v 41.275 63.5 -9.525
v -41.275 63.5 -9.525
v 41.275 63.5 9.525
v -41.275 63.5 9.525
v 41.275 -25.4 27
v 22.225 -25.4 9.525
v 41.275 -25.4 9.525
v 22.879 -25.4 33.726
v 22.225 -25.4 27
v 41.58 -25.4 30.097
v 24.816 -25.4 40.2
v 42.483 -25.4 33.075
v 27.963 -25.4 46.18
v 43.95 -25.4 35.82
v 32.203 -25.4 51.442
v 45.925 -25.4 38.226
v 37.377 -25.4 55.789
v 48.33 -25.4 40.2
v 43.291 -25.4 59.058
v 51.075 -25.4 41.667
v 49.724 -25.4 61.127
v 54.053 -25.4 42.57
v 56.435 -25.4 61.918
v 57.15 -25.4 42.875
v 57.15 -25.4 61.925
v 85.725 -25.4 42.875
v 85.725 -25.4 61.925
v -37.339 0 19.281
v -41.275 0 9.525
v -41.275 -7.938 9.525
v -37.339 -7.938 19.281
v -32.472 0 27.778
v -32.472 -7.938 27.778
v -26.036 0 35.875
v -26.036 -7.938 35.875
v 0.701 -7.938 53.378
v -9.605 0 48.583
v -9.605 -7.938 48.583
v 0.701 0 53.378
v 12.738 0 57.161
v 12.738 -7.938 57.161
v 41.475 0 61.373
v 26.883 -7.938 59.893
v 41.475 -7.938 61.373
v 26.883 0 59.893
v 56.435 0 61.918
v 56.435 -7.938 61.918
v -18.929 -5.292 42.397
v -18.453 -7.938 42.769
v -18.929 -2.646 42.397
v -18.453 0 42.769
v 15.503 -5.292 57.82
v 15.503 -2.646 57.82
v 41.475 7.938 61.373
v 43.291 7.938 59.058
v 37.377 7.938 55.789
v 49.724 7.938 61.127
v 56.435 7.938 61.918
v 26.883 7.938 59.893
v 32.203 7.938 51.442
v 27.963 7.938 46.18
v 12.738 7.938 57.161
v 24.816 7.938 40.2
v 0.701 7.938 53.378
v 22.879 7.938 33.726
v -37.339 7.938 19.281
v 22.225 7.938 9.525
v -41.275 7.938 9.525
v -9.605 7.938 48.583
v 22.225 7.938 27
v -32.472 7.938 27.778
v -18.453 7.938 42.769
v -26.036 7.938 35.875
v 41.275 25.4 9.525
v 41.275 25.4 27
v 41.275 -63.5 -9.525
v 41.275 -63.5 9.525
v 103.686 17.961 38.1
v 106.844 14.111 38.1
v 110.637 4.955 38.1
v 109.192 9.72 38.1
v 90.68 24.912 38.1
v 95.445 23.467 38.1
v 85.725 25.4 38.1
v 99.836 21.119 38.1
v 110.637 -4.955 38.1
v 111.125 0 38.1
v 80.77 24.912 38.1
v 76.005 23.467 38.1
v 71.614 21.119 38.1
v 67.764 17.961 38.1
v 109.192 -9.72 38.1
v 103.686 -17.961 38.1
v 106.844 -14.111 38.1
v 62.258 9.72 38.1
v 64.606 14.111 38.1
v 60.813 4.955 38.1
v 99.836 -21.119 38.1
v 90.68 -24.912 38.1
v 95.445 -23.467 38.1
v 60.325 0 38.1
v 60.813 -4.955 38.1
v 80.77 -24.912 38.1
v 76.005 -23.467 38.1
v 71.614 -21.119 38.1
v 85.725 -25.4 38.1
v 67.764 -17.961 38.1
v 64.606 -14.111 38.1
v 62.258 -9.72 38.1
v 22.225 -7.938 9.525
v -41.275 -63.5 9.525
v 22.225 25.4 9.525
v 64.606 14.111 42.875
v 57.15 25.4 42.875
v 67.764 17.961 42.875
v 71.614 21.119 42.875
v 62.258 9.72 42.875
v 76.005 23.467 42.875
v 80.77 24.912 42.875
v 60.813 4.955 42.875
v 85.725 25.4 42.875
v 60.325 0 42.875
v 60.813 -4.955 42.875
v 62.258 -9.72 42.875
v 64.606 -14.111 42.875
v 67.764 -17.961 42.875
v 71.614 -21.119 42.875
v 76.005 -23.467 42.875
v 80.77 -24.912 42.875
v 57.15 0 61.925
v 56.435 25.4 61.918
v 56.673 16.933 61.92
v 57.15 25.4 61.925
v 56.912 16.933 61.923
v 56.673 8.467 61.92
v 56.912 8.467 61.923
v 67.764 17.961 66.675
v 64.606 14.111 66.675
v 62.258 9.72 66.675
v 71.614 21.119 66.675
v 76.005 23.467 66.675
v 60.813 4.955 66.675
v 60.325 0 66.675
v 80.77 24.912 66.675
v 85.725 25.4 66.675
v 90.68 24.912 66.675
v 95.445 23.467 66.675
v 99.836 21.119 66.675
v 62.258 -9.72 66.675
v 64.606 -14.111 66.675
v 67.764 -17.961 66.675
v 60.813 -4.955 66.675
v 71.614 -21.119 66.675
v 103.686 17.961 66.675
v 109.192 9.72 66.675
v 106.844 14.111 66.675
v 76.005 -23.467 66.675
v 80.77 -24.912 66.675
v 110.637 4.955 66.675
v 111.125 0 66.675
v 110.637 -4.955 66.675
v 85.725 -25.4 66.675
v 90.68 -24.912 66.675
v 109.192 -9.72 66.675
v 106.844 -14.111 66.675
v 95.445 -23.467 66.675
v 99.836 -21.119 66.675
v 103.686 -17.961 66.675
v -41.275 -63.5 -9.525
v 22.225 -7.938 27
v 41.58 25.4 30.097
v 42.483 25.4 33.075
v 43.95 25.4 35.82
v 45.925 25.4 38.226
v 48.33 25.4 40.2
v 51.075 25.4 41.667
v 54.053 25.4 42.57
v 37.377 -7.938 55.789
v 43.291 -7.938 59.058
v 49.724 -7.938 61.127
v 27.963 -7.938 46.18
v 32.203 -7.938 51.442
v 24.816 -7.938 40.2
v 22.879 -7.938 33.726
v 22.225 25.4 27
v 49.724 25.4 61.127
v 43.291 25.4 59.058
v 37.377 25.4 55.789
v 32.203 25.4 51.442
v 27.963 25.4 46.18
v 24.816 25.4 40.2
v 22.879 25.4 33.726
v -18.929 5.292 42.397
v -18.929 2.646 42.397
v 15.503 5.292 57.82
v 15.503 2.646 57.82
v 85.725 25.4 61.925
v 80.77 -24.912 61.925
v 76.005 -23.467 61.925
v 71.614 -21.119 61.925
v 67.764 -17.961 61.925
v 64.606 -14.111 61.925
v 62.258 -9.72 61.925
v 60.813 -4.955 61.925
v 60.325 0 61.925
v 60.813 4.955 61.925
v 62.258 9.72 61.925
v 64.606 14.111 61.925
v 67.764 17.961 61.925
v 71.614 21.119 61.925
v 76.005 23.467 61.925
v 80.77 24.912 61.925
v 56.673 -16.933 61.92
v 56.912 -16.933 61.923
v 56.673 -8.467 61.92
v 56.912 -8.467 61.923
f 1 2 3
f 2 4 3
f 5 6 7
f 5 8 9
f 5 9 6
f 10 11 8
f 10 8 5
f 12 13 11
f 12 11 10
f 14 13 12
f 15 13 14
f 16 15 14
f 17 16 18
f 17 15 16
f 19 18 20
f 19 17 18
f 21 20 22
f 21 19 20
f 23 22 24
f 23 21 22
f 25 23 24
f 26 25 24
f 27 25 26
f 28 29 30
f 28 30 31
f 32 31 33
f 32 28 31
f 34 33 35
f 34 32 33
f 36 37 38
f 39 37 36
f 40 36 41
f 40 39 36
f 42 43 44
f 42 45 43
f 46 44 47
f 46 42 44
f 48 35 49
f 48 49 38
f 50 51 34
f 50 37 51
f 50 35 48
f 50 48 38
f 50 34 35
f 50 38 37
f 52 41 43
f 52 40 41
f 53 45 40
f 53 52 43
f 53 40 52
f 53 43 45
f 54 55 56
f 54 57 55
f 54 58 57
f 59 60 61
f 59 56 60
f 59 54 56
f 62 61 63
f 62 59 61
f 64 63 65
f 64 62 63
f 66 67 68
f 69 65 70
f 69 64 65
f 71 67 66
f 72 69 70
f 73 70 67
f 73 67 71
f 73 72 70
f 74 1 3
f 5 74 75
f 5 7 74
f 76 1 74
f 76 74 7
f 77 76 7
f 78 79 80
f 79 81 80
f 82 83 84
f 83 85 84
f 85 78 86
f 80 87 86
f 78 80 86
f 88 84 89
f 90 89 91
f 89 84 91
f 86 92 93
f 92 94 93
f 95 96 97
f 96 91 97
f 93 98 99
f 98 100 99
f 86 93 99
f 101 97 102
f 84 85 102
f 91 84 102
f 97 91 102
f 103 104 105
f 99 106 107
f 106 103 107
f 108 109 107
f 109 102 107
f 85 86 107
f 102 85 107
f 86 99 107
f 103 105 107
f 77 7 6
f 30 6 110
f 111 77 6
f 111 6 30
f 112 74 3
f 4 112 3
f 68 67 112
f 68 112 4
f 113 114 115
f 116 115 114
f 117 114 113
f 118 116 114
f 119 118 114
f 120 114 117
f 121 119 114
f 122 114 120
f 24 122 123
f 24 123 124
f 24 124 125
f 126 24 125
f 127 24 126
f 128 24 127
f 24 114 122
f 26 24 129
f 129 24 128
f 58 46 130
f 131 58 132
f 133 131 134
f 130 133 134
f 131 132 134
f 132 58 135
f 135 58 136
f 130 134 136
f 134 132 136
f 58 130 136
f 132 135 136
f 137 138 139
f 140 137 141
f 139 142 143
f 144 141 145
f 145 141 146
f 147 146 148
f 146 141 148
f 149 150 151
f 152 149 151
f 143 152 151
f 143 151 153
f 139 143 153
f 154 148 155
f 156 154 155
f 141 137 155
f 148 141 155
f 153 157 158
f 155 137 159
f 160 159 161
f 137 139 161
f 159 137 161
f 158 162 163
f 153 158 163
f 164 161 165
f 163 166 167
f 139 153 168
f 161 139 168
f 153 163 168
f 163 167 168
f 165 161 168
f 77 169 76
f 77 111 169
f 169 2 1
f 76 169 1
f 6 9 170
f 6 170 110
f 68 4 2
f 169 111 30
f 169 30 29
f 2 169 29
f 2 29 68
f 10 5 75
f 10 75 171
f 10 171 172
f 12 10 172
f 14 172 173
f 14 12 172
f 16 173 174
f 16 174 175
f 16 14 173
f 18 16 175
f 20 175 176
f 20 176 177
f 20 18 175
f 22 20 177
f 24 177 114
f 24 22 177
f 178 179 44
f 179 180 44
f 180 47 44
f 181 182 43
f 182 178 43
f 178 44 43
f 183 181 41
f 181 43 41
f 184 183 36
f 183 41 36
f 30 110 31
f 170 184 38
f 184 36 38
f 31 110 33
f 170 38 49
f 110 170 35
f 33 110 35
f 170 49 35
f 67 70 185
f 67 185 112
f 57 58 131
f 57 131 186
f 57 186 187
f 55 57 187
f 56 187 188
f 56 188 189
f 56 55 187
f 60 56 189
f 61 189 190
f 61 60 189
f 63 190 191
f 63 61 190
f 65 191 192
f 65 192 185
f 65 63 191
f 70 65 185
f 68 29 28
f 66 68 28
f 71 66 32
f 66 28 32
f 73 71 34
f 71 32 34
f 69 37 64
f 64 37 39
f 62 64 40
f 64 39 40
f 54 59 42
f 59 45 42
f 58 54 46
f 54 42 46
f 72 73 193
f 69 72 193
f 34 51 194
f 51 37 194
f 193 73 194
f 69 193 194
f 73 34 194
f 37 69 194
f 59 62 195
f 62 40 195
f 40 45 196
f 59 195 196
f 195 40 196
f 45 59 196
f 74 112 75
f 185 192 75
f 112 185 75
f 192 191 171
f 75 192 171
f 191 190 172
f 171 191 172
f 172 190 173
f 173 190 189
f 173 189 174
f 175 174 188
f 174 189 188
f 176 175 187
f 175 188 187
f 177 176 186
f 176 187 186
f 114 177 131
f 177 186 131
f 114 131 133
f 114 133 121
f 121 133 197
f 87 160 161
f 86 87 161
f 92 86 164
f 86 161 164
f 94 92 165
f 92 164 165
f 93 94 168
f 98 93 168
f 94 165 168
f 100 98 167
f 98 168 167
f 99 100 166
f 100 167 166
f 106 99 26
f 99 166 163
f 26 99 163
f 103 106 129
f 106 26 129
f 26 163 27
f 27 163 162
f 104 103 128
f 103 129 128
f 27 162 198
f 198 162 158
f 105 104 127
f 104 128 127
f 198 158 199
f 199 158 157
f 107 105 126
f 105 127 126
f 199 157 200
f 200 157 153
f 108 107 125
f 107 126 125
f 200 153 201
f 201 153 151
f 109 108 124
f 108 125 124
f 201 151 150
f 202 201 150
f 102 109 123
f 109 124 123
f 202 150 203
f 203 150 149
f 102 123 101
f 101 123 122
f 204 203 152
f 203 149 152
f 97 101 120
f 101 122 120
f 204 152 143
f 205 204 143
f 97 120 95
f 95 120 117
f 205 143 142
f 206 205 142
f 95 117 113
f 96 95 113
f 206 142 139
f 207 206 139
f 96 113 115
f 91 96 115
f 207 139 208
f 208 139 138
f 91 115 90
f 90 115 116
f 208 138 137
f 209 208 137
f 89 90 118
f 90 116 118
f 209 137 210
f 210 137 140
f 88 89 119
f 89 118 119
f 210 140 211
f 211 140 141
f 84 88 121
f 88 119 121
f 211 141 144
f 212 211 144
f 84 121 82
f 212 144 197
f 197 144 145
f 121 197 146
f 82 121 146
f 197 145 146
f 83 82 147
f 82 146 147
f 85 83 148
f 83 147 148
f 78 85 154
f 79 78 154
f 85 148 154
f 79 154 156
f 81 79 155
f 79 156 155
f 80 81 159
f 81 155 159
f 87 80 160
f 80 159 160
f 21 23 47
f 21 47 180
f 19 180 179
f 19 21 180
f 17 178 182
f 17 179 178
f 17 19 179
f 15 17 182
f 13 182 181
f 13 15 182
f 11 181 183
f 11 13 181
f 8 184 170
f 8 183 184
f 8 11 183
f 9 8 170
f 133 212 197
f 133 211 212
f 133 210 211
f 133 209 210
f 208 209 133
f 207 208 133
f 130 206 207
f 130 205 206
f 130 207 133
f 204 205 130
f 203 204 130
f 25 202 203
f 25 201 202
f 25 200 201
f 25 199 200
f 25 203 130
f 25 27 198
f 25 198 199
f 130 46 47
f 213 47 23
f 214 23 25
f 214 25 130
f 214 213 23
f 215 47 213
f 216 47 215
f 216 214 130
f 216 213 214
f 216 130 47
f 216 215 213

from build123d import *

# Parameters (mm, degrees)
F1_DEPTH = 63.5
F0_W     = 25.4
F0_H     = 19.05
F2_DEPTH = 25.4
F3_DEPTH = 7.9375


with BuildPart() as f1:
    # F0 (on Front) → F1 (new body, symmetric)
    with BuildSketch(Plane.XZ):
        Polygon((-41.275, -9.525), (41.275, -9.525), (41.275, 9.525), (22.225, 9.525), (-41.275, 9.525), align=None)
    extrude(amount=F1_DEPTH, both=True)

    # F0 (on Front) → F2 (join, symmetric)
    with BuildSketch(Plane.XZ):
        with BuildLine():
            Line((22.225, 9.525), (41.275, 9.525))
            Line((41.275, 9.525), (41.275, 27.0002))
            ThreePointArc((41.275, 27.0002), (45.9246798487, 38.2255201513), (57.15, 42.8752))
            Line((57.15, 42.8752), (60.325, 42.8752))
            Line((60.325, 42.8752), (60.325, 61.9252))
            Line((60.325, 61.9252), (57.15, 61.9252))
            add(Edge.make_bspline(
                [(56.4347952679, 61.9178761425), (56.6731549008, 61.920563236), (56.9115579755, 61.9230028803), (57.15, 61.9252)],
                knots=[110.8800193366, 110.8800193366, 110.8800193366, 110.8800193366, 111.5045361635, 111.5045361635, 111.5045361635, 111.5045361635], degree=3))
            ThreePointArc((56.4347952679, 61.9178761425), (32.2027140728, 51.4417332961), (22.225, 27.0002))
            Line((22.225, 27.0002), (22.225, 9.525))
        make_face()
        with Locations((73.025, 52.4002)):
            Rectangle(F0_W, F0_H)
    extrude(amount=F2_DEPTH, both=True)

    # F0 (on Front) → F3 (join, symmetric)
    with BuildSketch(Plane.XZ):
        with BuildLine():
            add(Edge.make_bspline(
                [(-41.275, 9.525), (-26.8350750497, 53.1635386099), (14.1151658157, 61.4407953484), (56.4347952679, 61.9178761425)],
                knots=[0, 0, 0, 0, 110.8800193366, 110.8800193366, 110.8800193366, 110.8800193366], degree=3))
            Line((-41.275, 9.525), (22.225, 9.525))
            Line((22.225, 9.525), (22.225, 27.0002))
            ThreePointArc((22.225, 27.0002), (32.2027140728, 51.4417332961), (56.4347952679, 61.9178761425))
        make_face()
    extrude(amount=F3_DEPTH, both=True)

    # F0 (on Front) → F4 (revolve)
    with BuildSketch(Plane.XZ):
        Polygon((85.725, 61.9252), (85.725, 42.8752), (85.725, 38.1), (111.125, 38.1), (111.125, 66.675), (85.725, 66.675), align=None)
    revolve(axis=Axis((85.725, 0, 52.3875), (0, 0, -1)))


solid = f1.part
